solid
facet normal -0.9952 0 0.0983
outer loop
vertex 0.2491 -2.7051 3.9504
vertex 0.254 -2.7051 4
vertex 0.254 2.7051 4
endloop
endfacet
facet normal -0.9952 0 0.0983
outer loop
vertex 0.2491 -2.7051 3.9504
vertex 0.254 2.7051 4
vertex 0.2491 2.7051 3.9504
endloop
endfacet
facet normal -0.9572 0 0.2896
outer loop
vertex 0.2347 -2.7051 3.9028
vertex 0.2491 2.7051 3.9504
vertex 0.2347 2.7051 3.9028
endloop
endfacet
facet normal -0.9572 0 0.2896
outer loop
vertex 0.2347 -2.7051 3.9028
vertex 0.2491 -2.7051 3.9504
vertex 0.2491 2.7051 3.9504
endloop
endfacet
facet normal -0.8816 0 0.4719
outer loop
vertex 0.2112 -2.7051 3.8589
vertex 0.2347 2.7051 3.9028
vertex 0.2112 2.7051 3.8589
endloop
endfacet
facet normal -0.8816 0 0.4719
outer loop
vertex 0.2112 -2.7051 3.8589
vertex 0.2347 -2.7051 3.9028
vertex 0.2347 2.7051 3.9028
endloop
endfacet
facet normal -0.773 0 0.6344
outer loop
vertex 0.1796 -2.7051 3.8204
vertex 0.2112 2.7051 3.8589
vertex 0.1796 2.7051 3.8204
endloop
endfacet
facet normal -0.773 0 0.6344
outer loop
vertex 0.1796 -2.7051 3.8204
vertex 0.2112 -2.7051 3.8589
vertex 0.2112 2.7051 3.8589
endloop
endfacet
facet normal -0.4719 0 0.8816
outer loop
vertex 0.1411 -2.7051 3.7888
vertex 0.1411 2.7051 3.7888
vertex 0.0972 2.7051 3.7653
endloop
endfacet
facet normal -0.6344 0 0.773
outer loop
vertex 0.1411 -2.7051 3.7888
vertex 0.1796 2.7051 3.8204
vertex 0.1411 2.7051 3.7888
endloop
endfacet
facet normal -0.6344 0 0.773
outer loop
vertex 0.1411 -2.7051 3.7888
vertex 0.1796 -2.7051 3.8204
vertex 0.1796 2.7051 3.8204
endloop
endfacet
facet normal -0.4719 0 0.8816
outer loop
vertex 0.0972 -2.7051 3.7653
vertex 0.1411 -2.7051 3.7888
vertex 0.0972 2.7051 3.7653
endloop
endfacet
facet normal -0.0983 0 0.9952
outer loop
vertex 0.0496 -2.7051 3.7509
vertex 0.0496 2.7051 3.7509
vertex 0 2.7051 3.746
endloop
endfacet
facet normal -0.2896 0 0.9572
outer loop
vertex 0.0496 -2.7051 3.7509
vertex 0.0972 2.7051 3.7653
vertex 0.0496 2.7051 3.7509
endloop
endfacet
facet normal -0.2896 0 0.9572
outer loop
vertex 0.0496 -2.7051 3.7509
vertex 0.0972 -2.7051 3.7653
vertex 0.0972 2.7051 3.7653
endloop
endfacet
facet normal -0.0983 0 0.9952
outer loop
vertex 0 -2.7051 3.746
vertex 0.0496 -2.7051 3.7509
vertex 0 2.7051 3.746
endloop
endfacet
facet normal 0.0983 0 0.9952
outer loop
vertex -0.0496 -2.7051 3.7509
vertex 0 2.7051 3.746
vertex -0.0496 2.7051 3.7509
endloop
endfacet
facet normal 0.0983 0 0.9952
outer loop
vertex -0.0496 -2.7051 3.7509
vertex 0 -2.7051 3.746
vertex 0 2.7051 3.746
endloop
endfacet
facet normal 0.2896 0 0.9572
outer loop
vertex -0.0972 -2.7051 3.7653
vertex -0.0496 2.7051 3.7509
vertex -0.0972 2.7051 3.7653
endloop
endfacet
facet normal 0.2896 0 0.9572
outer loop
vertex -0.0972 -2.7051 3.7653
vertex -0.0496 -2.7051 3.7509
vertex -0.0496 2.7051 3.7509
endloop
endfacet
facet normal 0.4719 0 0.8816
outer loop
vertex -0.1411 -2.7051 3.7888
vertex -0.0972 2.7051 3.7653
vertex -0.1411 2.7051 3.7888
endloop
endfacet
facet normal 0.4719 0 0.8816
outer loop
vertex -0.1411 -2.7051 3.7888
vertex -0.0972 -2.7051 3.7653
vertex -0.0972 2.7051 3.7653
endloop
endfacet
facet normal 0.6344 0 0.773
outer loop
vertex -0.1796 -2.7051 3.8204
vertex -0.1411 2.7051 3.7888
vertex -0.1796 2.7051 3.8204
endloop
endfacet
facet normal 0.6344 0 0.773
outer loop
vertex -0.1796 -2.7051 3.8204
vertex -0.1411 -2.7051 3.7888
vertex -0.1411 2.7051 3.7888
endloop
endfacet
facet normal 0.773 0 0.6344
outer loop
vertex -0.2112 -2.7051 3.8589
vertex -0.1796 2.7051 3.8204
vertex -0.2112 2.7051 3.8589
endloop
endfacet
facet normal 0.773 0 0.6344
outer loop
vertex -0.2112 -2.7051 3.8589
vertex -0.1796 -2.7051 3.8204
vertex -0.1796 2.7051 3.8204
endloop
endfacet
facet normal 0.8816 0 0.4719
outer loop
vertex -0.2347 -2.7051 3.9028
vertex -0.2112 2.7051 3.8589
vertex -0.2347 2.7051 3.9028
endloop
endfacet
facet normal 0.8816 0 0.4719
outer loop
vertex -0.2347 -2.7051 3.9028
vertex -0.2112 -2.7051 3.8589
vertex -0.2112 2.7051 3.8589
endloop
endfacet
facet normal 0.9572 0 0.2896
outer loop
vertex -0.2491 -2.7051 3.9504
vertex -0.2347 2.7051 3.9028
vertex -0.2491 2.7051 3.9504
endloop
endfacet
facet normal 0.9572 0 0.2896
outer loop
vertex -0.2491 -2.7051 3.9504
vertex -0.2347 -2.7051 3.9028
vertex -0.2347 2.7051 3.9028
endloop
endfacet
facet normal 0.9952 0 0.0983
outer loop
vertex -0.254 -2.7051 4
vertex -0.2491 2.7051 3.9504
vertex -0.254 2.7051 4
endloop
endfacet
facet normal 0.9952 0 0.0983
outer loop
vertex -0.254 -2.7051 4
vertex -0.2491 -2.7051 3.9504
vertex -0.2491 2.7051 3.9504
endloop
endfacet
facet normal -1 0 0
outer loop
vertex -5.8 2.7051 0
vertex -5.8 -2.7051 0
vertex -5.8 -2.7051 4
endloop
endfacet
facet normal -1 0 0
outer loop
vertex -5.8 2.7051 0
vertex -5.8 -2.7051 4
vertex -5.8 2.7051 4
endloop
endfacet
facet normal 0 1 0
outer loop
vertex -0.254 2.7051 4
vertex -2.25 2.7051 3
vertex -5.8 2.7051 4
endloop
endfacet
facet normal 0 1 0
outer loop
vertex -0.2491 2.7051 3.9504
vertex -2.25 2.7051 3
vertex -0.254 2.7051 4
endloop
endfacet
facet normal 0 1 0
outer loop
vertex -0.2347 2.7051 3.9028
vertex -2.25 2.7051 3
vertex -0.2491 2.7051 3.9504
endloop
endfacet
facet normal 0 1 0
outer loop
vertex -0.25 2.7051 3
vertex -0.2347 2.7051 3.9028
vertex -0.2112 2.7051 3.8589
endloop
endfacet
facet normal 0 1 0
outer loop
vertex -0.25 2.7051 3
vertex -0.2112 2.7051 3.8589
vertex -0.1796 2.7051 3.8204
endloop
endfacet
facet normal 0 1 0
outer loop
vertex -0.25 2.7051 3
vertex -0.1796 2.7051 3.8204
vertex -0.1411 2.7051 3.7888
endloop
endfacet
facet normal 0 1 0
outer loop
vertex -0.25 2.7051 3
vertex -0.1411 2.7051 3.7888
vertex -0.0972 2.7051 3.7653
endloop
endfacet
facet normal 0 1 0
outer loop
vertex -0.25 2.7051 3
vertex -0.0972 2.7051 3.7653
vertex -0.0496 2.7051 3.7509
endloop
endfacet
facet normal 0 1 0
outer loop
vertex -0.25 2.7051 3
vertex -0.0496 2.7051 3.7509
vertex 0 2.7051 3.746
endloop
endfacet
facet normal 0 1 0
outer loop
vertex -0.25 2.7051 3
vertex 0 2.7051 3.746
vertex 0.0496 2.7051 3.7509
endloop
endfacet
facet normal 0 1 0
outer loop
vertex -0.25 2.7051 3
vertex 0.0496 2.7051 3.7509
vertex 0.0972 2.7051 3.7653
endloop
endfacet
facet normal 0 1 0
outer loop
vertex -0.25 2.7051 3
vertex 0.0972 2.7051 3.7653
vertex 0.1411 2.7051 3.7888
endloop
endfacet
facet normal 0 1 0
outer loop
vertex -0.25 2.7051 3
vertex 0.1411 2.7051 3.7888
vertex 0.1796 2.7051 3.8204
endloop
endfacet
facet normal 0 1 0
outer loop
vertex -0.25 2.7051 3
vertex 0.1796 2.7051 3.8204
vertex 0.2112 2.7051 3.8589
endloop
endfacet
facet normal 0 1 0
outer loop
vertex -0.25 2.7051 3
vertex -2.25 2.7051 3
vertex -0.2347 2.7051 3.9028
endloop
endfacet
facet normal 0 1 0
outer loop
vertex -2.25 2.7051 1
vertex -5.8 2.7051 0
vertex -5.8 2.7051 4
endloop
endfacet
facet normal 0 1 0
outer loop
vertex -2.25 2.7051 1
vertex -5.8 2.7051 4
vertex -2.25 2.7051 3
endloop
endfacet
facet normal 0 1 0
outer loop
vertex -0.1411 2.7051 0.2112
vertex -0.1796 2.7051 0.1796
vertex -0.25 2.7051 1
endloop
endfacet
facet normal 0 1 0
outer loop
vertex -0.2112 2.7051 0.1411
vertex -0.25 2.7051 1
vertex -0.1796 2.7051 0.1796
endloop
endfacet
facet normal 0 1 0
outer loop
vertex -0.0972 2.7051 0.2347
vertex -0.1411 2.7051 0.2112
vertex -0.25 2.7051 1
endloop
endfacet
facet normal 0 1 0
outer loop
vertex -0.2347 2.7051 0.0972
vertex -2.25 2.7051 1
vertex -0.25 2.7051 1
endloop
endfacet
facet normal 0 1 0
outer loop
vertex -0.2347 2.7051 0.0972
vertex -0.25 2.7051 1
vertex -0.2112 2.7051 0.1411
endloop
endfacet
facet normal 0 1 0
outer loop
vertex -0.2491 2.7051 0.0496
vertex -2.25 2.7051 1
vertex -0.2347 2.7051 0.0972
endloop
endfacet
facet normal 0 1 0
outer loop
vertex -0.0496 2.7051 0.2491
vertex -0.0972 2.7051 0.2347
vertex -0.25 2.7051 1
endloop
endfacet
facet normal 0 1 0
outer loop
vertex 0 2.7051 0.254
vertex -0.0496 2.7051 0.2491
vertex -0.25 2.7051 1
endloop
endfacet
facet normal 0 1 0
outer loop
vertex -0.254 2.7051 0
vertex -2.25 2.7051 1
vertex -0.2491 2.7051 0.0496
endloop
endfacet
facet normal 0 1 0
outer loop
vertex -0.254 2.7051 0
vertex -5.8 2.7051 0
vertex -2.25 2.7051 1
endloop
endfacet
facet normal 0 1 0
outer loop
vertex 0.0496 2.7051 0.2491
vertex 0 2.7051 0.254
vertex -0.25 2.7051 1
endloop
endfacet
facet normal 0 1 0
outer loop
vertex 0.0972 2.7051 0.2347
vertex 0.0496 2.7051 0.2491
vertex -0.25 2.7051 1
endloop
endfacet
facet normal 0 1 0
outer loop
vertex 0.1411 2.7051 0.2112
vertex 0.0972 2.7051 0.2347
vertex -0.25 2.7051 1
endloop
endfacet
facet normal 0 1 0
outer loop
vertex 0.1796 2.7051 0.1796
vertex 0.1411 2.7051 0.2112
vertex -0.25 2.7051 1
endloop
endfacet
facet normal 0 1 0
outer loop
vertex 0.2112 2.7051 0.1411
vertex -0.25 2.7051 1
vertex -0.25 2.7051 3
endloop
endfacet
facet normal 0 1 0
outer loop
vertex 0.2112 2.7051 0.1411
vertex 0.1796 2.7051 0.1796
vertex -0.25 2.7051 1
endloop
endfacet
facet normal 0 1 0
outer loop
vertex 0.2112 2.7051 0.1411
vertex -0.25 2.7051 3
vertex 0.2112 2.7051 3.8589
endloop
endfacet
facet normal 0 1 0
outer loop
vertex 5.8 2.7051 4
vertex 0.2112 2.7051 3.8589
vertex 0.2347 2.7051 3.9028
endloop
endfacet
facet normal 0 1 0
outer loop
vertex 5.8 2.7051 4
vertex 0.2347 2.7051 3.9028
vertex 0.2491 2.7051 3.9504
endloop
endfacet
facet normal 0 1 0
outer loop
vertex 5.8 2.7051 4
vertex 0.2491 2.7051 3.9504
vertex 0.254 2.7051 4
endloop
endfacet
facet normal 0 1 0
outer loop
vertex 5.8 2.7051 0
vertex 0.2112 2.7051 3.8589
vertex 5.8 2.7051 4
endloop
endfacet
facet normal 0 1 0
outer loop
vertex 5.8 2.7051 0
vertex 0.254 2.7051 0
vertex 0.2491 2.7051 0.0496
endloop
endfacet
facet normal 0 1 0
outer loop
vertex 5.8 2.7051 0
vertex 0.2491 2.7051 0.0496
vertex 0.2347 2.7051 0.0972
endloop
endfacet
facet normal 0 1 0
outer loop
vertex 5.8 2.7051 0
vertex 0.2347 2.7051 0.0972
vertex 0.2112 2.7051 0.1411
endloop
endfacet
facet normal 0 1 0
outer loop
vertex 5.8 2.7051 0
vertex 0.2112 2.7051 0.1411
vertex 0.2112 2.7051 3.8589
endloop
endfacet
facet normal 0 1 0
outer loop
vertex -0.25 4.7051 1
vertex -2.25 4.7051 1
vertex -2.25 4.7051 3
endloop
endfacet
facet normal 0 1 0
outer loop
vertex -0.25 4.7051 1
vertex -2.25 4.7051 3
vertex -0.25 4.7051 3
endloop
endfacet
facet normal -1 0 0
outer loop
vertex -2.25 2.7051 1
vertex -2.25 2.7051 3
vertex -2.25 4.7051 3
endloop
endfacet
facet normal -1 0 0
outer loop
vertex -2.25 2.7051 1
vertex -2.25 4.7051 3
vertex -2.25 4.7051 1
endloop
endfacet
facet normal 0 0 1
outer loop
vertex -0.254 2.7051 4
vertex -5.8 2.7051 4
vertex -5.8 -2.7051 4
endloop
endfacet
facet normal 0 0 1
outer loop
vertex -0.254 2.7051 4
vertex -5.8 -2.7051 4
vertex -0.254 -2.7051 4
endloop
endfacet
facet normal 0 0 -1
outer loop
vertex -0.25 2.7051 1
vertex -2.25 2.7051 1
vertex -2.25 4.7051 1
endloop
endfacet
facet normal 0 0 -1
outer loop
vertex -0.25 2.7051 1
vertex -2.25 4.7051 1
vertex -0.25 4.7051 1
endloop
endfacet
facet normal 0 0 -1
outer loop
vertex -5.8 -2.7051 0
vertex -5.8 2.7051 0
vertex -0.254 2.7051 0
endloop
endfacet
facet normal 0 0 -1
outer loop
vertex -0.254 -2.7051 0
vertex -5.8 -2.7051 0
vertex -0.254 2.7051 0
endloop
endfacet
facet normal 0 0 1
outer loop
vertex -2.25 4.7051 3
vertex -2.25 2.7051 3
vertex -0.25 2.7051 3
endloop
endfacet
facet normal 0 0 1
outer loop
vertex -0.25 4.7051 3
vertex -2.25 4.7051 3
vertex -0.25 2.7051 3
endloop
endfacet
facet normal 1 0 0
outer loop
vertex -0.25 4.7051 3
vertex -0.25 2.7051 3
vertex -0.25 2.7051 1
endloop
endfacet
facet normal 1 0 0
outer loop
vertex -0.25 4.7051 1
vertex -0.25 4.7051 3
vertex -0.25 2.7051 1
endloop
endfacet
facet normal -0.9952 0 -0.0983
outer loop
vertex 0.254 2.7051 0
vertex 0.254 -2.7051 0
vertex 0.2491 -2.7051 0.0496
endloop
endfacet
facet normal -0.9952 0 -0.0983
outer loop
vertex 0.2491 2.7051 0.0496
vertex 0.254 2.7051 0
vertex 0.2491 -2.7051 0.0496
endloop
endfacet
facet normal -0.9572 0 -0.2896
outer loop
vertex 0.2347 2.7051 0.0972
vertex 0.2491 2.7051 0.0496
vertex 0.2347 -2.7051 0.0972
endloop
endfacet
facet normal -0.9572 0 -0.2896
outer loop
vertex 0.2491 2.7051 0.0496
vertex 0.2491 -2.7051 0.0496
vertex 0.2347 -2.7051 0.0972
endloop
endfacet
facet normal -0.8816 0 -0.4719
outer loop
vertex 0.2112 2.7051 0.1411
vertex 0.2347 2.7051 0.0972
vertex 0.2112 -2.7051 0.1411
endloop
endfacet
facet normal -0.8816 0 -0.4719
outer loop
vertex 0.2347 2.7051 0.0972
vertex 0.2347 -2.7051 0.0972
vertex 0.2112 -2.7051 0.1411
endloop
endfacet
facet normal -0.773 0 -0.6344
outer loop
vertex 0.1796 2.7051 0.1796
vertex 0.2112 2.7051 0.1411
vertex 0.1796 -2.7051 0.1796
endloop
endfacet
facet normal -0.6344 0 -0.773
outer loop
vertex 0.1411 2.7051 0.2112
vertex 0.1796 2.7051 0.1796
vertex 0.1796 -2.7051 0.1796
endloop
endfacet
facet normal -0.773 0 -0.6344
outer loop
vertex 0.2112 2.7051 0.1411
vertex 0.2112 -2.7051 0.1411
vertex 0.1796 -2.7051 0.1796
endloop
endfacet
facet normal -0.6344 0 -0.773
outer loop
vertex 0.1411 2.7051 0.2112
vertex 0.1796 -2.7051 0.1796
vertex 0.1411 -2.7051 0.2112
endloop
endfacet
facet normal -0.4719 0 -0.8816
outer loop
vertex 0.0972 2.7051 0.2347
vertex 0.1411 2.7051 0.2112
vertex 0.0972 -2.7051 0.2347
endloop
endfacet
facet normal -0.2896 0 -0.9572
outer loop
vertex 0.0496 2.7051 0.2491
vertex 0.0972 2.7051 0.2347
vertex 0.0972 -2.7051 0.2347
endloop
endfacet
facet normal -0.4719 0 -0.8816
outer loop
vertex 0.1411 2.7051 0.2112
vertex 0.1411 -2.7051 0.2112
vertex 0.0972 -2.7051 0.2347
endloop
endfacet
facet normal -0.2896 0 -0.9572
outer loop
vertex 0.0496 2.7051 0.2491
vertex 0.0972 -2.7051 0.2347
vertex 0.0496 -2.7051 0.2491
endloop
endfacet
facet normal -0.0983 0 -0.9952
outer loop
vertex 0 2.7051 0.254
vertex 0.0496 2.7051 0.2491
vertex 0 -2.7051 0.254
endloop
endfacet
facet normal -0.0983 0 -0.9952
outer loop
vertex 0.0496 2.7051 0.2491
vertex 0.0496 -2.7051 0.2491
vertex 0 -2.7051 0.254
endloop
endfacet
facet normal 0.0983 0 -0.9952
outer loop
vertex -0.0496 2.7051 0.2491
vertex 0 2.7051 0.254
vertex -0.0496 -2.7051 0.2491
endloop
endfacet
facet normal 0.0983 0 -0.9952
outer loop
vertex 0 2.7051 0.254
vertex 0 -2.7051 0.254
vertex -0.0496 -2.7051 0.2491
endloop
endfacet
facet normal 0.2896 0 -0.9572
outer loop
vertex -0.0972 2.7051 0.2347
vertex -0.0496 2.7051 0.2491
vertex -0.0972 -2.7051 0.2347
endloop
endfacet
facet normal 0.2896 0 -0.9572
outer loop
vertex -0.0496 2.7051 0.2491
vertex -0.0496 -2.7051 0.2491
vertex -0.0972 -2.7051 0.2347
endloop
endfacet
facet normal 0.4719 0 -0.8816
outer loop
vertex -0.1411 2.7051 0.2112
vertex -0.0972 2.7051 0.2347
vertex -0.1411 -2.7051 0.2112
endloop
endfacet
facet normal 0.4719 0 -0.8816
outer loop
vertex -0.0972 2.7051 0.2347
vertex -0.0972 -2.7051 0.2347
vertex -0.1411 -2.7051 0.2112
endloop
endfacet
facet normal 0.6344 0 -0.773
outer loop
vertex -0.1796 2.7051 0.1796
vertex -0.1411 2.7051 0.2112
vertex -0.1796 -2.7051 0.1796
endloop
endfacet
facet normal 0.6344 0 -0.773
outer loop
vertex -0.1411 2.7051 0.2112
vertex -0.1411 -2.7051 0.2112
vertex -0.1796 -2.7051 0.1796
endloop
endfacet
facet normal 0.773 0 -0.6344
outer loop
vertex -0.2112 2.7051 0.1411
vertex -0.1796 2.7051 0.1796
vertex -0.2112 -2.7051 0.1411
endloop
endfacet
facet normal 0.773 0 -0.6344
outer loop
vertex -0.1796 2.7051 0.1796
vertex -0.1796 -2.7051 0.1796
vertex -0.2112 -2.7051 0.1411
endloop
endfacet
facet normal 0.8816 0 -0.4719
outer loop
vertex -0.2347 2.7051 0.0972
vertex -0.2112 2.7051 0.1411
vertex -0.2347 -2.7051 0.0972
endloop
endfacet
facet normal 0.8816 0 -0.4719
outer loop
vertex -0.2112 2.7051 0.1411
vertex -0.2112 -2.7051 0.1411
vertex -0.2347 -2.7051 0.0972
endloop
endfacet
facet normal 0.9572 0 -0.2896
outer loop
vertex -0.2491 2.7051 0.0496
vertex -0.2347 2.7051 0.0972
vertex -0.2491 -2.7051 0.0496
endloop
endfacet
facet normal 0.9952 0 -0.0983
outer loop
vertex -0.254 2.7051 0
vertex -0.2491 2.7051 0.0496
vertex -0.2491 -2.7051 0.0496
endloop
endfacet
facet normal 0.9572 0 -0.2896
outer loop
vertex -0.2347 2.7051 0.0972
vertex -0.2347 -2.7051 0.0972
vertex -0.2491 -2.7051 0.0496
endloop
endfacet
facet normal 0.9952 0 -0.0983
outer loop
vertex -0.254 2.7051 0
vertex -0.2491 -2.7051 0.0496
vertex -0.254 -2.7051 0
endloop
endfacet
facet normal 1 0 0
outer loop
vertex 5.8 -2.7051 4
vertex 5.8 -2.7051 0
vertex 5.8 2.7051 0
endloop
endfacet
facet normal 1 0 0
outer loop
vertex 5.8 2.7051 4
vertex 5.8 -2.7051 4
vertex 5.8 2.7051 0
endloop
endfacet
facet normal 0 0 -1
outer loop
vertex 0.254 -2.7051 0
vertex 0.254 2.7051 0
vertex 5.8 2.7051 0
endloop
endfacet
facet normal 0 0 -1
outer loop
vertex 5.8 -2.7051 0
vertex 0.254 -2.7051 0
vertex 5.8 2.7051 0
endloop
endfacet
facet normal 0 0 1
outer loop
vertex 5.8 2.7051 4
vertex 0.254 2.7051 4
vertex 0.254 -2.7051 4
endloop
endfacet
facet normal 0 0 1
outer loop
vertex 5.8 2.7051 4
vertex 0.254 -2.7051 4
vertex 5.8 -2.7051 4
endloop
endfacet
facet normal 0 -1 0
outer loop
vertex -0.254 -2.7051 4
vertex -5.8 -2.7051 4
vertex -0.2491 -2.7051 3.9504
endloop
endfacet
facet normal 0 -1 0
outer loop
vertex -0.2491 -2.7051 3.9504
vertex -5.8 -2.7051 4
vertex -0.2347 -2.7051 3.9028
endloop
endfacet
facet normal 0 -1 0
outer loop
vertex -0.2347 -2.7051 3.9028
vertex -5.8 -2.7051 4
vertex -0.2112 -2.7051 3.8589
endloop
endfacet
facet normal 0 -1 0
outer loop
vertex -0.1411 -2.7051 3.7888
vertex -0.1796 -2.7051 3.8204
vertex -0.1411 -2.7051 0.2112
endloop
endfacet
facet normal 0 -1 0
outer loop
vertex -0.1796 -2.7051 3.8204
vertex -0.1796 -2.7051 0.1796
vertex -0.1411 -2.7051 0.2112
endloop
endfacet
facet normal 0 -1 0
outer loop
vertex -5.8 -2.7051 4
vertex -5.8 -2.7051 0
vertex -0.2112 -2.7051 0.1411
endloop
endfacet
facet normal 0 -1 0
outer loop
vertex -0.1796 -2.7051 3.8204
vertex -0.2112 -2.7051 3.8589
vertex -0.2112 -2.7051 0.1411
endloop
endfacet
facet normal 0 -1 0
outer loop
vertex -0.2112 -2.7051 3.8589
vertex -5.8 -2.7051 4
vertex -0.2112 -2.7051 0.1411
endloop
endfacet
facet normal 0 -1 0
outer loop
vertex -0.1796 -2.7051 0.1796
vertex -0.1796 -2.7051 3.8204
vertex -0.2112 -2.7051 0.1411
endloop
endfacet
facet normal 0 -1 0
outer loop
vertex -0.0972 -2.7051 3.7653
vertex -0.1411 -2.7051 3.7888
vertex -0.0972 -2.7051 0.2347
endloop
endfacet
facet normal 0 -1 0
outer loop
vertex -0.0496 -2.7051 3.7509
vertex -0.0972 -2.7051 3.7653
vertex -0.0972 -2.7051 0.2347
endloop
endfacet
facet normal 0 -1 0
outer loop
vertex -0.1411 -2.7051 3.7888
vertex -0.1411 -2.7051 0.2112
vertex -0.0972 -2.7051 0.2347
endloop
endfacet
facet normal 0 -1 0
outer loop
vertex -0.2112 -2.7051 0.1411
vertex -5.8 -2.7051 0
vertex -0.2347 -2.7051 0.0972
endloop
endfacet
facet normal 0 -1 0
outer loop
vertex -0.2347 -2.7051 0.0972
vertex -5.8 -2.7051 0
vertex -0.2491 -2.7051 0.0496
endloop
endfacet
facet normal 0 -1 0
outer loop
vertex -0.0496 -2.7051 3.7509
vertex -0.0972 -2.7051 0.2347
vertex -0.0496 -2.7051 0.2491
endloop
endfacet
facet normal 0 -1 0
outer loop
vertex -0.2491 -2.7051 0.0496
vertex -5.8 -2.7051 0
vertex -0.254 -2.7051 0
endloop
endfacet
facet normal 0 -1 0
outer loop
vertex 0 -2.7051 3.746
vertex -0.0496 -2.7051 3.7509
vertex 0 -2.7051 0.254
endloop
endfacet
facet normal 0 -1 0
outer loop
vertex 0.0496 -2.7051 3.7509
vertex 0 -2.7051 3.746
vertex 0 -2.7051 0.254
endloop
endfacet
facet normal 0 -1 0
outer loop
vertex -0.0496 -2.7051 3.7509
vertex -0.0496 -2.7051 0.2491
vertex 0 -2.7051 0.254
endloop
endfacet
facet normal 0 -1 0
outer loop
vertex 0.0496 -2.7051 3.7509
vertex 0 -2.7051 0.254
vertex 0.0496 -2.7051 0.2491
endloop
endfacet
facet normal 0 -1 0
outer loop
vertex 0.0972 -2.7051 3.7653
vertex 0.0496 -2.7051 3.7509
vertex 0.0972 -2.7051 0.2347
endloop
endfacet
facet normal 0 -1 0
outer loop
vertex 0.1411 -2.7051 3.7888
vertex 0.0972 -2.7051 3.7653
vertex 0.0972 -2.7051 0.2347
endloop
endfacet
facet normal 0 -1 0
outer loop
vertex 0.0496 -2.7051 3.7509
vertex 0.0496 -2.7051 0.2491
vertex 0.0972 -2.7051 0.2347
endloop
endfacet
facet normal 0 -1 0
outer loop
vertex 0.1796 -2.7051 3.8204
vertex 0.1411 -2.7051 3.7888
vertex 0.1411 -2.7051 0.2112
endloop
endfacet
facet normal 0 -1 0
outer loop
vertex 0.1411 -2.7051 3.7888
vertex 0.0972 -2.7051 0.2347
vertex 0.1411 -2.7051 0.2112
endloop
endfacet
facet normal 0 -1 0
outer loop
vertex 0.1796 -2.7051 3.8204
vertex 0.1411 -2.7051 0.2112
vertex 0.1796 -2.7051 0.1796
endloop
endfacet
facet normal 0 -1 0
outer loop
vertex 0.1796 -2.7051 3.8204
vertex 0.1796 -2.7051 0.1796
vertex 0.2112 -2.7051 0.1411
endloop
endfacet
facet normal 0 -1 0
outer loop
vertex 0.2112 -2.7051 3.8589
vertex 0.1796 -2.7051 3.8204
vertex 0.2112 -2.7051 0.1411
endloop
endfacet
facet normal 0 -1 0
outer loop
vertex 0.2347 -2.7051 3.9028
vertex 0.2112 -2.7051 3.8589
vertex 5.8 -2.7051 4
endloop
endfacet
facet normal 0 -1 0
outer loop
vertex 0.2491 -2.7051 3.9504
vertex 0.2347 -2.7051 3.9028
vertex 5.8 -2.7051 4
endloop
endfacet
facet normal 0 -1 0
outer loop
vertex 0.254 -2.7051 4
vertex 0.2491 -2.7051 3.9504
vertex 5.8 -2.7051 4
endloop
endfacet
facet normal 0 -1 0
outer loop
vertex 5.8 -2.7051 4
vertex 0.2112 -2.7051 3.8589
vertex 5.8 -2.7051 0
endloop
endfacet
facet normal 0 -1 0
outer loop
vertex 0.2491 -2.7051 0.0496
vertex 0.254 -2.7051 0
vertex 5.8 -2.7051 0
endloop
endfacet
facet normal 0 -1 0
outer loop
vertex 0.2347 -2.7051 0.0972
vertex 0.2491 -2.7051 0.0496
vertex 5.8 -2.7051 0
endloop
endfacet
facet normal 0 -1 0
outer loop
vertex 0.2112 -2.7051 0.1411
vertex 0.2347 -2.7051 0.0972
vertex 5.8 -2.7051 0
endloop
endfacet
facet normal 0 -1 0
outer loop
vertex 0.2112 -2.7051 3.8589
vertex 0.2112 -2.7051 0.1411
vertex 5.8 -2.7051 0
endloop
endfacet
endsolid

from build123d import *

# Parameters (mm, degrees)
SKETCH1_W               = 11.6
SKETCH1_H               = 5.4102
BOSS_EXTRUDE1_DEPTH     = 4
SKETCH2_W               = 2
SKETCH2_H               = 2
BOSS_EXTRUDE2_DEPTH     = 2
CUT_EXTRUDE1_DEPTH      = 9.883144941
CUT_EXTRUDE1_DEPTH_BACK = 9.883144941


with BuildPart() as part:
    # Sketch1 → Boss-Extrude1 (new body)
    with BuildSketch(Plane.XY):
        Rectangle(SKETCH1_W, SKETCH1_H)
    extrude(amount=BOSS_EXTRUDE1_DEPTH)

    # Sketch2 → Boss-Extrude2 (add)
    with BuildSketch(Plane(origin=(0, 2.7051, 0), x_dir=(1, 0, 0), z_dir=(0, 1, 0))):
        with Locations((-1.25, -2)):
            Rectangle(SKETCH2_W, SKETCH2_H)
    extrude(amount=BOSS_EXTRUDE2_DEPTH)

    # Sketch3 → Cut-Extrude1 (cut, two sides: drawn at the far end of the back side and taken through both)
    with BuildSketch(Plane(origin=(0, 2.7051, 0), x_dir=(1, 0, 0), z_dir=(0, 1, 0)).offset(-CUT_EXTRUDE1_DEPTH_BACK)):
        with BuildLine():
            Line((-0.254, 0), (0.254, 0))
            ThreePointArc((0.254, 0), (0, -0.254), (-0.254, 0))
        make_face()
        with BuildLine():
            Line((-0.254, -4), (0.254, -4))
            ThreePointArc((0.254, -4), (0, -3.746), (-0.254, -4))
        make_face()
    extrude(amount=CUT_EXTRUDE1_DEPTH + CUT_EXTRUDE1_DEPTH_BACK, mode=Mode.SUBTRACT)


solid = part.part
